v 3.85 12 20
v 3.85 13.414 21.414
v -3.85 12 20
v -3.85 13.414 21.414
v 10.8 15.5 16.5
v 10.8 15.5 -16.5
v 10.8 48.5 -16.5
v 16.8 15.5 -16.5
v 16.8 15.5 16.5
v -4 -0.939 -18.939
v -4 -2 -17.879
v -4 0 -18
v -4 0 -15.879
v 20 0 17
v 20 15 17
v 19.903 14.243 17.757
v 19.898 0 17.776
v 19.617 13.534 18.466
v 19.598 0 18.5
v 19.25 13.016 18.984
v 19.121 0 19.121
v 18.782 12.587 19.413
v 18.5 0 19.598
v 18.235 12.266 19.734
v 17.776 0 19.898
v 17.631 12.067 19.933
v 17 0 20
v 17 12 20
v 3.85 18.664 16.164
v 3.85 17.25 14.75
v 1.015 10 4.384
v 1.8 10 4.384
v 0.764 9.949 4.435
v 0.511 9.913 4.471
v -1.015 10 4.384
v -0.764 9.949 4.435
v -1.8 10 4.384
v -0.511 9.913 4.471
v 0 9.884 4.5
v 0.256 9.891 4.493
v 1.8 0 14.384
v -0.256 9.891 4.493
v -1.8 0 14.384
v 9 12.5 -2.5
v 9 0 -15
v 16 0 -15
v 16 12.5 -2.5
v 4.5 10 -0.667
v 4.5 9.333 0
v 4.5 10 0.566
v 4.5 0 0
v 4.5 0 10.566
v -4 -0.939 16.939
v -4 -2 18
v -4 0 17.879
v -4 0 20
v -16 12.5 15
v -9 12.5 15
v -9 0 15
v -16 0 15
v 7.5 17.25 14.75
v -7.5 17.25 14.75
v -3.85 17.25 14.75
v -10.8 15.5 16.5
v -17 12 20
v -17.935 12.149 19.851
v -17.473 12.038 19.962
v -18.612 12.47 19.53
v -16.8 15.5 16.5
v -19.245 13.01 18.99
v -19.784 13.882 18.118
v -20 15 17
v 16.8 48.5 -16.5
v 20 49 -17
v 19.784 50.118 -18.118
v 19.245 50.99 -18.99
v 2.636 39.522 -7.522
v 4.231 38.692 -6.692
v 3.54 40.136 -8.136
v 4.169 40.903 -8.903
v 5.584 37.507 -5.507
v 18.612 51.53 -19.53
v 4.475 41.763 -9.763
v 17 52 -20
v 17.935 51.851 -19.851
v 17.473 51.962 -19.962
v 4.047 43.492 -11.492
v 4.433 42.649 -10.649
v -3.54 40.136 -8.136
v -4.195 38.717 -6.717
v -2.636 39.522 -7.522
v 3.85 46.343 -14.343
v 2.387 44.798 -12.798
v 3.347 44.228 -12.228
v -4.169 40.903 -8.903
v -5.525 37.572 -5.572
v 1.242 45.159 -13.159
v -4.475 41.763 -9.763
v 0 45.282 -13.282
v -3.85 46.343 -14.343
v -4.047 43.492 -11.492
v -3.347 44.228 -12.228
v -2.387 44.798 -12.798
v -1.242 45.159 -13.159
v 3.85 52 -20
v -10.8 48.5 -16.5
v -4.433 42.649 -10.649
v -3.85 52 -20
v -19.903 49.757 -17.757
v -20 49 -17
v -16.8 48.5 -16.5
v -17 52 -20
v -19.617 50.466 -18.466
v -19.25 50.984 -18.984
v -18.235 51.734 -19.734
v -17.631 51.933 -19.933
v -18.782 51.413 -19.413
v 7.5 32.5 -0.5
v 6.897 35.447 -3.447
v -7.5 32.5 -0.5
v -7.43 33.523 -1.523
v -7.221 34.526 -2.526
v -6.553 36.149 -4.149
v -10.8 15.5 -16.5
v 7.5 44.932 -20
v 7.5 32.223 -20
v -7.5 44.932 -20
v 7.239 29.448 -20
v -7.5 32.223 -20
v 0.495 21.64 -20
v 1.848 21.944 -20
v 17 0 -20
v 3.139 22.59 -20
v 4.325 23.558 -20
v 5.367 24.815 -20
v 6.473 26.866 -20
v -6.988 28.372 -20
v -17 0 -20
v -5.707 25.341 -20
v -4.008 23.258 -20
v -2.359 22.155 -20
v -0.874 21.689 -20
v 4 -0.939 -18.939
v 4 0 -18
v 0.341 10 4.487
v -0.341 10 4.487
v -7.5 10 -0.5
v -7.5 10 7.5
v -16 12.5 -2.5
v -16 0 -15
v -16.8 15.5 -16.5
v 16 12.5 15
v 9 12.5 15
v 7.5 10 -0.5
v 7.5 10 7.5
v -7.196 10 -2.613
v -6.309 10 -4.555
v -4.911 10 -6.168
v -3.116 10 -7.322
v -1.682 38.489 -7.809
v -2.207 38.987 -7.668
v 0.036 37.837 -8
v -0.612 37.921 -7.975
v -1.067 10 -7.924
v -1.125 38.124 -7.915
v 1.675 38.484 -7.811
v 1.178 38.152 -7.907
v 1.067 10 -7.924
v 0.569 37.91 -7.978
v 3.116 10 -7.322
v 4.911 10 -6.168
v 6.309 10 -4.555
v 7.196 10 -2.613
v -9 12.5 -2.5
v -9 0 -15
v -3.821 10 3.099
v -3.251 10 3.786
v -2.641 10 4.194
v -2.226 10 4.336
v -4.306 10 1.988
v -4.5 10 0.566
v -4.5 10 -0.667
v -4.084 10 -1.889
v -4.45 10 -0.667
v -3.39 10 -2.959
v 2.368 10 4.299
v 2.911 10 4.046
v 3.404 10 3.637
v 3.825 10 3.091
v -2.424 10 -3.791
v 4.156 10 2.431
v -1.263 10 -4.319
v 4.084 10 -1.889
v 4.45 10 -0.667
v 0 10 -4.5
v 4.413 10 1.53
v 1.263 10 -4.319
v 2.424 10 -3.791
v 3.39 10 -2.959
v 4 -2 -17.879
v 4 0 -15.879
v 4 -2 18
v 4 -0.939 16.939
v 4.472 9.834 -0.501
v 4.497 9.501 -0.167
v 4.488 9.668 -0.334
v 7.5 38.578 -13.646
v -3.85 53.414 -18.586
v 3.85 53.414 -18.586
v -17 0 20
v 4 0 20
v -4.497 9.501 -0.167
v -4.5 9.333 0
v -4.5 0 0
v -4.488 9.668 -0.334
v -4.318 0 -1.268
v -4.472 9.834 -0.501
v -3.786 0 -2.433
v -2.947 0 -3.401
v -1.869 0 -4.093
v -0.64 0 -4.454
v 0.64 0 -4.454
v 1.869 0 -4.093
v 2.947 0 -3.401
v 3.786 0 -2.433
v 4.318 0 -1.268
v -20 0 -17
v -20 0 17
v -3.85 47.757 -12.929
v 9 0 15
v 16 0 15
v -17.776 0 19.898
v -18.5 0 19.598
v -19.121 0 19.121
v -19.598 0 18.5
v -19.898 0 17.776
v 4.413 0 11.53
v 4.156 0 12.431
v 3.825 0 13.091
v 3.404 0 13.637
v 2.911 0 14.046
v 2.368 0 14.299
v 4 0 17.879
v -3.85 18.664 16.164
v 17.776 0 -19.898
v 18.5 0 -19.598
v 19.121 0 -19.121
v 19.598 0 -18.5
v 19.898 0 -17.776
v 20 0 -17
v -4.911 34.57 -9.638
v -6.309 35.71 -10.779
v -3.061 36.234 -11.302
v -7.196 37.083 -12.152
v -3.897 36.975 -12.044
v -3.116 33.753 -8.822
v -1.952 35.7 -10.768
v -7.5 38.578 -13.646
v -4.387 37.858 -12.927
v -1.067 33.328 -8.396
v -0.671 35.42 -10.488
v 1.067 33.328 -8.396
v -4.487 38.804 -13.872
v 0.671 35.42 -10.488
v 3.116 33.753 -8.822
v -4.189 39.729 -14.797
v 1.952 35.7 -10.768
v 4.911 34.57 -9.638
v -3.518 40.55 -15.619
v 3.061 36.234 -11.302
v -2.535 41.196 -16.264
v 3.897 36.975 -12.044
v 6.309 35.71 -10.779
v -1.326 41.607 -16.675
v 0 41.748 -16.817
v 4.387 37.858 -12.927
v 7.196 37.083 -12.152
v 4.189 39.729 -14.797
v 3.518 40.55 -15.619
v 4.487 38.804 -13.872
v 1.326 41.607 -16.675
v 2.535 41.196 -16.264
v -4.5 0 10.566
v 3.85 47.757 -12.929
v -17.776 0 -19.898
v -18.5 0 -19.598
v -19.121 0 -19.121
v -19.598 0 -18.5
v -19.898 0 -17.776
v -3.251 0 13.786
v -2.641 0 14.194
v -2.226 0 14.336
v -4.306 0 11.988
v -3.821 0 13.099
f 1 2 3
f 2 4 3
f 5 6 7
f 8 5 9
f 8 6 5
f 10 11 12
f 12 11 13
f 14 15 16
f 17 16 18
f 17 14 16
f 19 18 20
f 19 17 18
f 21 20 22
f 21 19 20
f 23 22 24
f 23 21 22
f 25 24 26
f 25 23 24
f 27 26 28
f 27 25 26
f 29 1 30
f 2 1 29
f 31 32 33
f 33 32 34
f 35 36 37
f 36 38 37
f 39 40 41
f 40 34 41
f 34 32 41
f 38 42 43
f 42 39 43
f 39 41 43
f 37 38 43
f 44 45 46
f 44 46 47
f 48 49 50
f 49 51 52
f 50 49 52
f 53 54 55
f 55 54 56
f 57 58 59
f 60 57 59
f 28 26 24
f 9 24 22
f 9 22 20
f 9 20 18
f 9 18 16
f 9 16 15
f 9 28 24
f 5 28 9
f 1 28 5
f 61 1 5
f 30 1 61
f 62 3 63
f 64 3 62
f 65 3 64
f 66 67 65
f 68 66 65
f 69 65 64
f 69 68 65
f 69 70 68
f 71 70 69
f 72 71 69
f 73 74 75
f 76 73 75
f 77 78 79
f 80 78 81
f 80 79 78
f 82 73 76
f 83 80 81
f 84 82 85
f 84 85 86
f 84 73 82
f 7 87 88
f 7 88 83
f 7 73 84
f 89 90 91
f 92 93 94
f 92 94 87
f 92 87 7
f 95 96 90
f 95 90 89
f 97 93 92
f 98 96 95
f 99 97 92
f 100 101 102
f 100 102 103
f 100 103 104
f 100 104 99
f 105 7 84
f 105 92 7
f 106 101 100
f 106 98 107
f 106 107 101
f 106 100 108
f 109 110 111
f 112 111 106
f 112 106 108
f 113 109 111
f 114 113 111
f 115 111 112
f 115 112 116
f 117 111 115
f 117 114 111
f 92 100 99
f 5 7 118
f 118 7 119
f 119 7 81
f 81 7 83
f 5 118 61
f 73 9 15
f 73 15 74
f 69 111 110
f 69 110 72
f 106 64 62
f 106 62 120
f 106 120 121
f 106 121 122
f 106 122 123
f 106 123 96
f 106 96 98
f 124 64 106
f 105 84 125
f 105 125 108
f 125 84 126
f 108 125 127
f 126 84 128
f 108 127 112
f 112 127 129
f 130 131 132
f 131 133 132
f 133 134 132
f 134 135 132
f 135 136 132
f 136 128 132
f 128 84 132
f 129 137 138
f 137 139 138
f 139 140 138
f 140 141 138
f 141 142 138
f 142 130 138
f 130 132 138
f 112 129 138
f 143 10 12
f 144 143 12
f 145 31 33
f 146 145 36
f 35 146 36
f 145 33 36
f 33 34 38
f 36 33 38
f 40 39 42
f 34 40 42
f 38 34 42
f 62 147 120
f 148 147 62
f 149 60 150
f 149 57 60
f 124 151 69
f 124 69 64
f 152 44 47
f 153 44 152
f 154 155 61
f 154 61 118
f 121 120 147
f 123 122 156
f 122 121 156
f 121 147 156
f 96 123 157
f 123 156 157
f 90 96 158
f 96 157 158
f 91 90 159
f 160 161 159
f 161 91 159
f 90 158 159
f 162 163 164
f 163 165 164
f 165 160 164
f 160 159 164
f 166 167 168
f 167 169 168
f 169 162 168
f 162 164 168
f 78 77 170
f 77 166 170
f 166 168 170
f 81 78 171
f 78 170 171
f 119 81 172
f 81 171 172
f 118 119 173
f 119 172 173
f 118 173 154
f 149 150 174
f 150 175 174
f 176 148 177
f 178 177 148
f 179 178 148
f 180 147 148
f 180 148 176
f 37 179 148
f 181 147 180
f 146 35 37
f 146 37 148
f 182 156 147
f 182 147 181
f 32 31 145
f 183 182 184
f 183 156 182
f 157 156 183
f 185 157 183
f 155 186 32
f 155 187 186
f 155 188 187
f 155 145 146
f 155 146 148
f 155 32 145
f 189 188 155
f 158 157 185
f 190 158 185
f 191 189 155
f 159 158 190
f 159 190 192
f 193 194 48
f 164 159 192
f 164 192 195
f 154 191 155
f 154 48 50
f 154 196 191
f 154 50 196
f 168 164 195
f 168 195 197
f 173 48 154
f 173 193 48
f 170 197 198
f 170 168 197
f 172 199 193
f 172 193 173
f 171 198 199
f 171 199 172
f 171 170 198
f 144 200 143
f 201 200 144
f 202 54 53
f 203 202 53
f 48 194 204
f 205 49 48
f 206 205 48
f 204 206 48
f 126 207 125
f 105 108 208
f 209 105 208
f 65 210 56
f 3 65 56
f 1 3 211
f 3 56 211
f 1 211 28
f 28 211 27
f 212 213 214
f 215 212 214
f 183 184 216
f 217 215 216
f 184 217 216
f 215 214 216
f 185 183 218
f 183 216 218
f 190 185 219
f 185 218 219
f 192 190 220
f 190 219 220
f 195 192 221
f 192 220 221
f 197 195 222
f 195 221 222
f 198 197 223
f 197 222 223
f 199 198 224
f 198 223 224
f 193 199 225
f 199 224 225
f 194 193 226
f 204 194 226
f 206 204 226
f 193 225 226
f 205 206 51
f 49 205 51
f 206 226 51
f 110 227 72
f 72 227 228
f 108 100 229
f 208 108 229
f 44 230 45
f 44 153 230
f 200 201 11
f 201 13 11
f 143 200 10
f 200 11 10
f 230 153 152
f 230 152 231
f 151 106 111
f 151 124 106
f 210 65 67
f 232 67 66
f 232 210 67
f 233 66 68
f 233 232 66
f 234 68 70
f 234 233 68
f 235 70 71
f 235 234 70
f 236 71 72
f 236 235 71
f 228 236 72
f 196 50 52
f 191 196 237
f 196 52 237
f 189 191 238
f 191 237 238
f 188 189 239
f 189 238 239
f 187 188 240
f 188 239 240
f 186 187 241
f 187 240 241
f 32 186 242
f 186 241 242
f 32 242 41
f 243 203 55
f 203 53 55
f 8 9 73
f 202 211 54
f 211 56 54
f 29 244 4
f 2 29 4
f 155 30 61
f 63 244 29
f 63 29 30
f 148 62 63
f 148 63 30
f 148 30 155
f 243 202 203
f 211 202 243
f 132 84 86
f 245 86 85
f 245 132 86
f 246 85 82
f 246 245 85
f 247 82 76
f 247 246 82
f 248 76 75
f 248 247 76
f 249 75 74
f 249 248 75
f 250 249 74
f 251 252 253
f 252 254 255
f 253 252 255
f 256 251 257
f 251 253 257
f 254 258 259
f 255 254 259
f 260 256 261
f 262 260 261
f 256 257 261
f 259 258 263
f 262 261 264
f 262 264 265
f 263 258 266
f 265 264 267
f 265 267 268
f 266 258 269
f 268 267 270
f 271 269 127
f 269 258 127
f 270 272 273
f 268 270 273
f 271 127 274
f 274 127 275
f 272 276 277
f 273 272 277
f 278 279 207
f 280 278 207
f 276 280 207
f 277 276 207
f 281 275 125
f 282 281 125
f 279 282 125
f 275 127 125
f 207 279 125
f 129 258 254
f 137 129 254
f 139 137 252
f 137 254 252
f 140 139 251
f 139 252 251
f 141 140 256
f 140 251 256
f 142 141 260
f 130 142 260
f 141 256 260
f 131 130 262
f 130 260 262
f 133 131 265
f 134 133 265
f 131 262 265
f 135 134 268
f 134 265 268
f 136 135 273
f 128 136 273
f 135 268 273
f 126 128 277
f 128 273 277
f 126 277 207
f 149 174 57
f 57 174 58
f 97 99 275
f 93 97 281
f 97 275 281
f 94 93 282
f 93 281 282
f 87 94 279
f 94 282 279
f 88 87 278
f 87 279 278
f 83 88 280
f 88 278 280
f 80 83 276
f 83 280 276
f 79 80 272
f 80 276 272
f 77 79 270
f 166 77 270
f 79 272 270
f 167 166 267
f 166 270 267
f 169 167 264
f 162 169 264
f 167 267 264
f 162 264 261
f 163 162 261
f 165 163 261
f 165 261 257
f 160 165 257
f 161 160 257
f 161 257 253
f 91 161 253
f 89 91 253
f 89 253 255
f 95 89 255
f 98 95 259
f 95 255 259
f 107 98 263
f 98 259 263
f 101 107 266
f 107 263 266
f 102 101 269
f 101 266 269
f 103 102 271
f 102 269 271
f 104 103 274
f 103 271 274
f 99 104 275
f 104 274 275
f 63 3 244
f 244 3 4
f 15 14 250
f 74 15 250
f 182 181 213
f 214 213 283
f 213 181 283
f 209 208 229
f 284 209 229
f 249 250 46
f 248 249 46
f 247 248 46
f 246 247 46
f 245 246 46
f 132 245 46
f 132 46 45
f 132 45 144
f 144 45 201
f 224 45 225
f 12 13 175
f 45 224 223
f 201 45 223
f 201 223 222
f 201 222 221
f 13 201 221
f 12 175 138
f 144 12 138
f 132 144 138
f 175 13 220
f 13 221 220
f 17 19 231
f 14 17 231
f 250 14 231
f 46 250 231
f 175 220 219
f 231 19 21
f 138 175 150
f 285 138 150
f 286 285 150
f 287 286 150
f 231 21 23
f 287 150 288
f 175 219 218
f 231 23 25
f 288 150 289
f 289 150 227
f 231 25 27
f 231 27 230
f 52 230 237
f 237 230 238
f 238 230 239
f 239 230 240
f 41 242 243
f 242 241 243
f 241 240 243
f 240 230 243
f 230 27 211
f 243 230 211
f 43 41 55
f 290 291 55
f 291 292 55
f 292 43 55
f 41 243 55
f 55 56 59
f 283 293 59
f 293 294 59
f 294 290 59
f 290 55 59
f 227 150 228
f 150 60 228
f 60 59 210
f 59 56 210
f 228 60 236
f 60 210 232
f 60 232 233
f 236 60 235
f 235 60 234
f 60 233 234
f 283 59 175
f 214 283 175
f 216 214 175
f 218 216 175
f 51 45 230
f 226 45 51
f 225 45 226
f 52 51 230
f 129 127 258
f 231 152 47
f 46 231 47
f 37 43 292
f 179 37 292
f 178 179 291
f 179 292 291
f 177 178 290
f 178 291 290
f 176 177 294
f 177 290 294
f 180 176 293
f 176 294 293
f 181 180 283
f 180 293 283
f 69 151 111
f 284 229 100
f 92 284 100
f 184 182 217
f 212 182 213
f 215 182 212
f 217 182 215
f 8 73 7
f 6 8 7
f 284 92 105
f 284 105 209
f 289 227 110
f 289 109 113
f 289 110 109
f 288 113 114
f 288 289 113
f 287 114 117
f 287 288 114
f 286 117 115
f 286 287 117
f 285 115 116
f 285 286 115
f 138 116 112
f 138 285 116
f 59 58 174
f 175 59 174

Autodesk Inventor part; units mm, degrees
ref_plane "YZ Plane" through (0, 0, 0) normal (1, 0, 0) x (0, 1, 0)
ref_plane "XZ Plane" through (0, 0, 0) normal (0, 1, 0) x (-1, 0, 0)
ref_plane "XY Plane" through (0, 0, 0) normal (0, 0, 1) x (1, 0, 0)
sketch "Sketch_1" plane through (0, 0, 0) normal (0, 1, 0) x (-1, 0, 0)
  arc A0 (20, 17) -> (17, 20) centre (17, 17) ccw
  line L0 (17, 20) -> (-17, 20)
  arc A1 (-17, 20) -> (-20, 17) centre (-17, 17) ccw
  line L1 (-20, 17) -> (-20, -17)
  arc A2 (-20, -17) -> (-17, -20) centre (-17, -17) ccw
  line L2 (-17, -20) -> (17, -20)
  arc A3 (17, -20) -> (20, -17) centre (17, -17) ccw
  line L3 (20, -17) -> (20, 17)
extrude "Extrusion1" add sketch "Sketch_1" along normal blind 52
sketch "Sketch_2" plane through (0, 0, 0) normal (1, 0, 0) x (0, 1, 0)
  line L0 (12, 20) -> (52, -20)
  line L1 (52, -20) -> (52, 20)
  line L2 (52, 20) -> (12, 20)
extrude "Extrusion2" cut sketch "Sketch_2" along normal mid plane 40
sketch "Sketch_13" plane through (0, 0, 0) normal (1, 0, 0) x (0, 1, 0)
  line L0 (13.4142, 21.4142) -> (12, 20)
  line L1 (12, 20) -> (17.3033, 14.6967)
  line L2 (17.3033, 14.6967) -> (18.7175, 16.1109)
  line L3 (18.7175, 16.1109) -> (13.4142, 21.4142)
extrude "Extrusion3" add sketch "Sketch_13" along normal mid plane 7.7
sketch "Sketch_14" plane through (0, 0, 0) normal (1, 0, 0) x (0, 1, 0)
  line L0 (47.7574, -12.9289) -> (46.3431, -14.3431)
  line L1 (46.3431, -14.3431) -> (52, -20)
  line L2 (52, -20) -> (53.4142, -18.5858)
  line L3 (53.4142, -18.5858) -> (47.7574, -12.9289)
extrude "Extrusion4" add sketch "Sketch_14" along normal mid plane 7.7
sketch "Sketch_3" plane through (0, 15.5, 0) normal (0, 1, 0) x (1, 0, 0)
  line L0 (-16.8, -23.5) -> (-10.8, -23.5)
  line L1 (-10.8, -23.5) -> (-10.8, 16.5)
  line L2 (-10.8, 16.5) -> (-16.8, 16.5)
  line L3 (-16.8, 16.5) -> (-16.8, -23.5)
extrude "Extrusion5" cut sketch "Sketch_3" along normal blind 40
sketch "Sketch_4" plane through (0, 15.5, 0) normal (0, 1, 0) x (1, 0, 0)
  line L0 (10.8, -23.5) -> (16.8, -23.5)
  line L1 (16.8, -23.5) -> (16.8, 16.5)
  line L2 (16.8, 16.5) -> (10.8, 16.5)
  line L3 (10.8, 16.5) -> (10.8, -23.5)
extrude "Extrusion6" cut sketch "Sketch_4" along normal blind 40
sketch "Sketch_5" plane through (0, 10, 0) normal (0, 1, 0) x (1, 0, 0)
  line L0 (-7.5, 0.5) -> (-7.5, -7.5)
  line L1 (-7.5, -7.5) -> (7.5, -7.5)
  line L2 (7.5, -7.5) -> (7.5, 0.5)
  arc A0 (7.5, 0.5) -> (-7.5, 0.5) centre (0, 0.5) ccw
extrude "Extrusion7" cut sketch "Sketch_5" along normal blind 40
sketch "Sketch_6" plane through (0, 0, 0) normal (1, 0, 0) x (0, 1, 0)
  line L0 (50, 20) -> (22.5, 20)
  line L1 (22.5, 20) -> (10, 7.5)
  line L2 (10, 7.5) -> (50, 7.5)
  line L3 (50, 7.5) -> (50, 20)
extrude "Extrusion8" cut sketch "Sketch_6" along normal mid plane 15
sketch "Sketch9" plane through (0, 10, 0) normal (0, 1, 0) x (1, 0, 0)
  point P0 (0, 0)
hole "Hole1" at (0, 10, 0) direction (0, -1, 0) diameter 9 depth 10
sketch "Sketch_8" plane through (0, 0, 14.3841) normal (0, -0.7071, 0.7071) x (1, 0, 0)
  line L0 (-4.5, -2.7) -> (-4.5, -3.5714)
  line L1 (-4.5, -3.5714) -> (4.5, -3.5714)
  line L2 (4.5, -3.5714) -> (4.5, -2.7)
  arc A0 (4.5, -2.7) -> (1.8, 0) centre (1.8, -2.7) ccw
  line L3 (1.8, 0) -> (-1.8, 0)
  arc A1 (-1.8, 0) -> (-4.5, -2.7) centre (-1.8, -2.7) ccw
extrude "Extrusion9" cut sketch "Sketch_8" against normal blind 20
sketch "Sketch_9" plane through (0, 0, 0) normal (1, 0, 0) x (0, 1, 0)
  line L0 (0, 9.67) -> (0, 0)
  line L1 (0, 0) -> (10, 0)
  line L2 (10, 0) -> (10, 4.3841)
  line L3 (10, 4.3841) -> (4.7141, 9.67)
  line L4 (4.7141, 9.67) -> (0, 9.67)
extrude "Extrusion10" cut sketch "Sketch_9" along normal mid plane 3
sketch "Sketch_10" plane through (0, 0, 0) normal (1, 0, 0) x (0, 1, 0)
  line L0 (0.7957, 9.77) -> (0, 9.77)
  line L1 (0, 9.77) -> (0, 0)
  line L2 (0, 0) -> (10, 0)
  line L3 (10, 0) -> (10, 0.5657)
  line L4 (10, 0.5657) -> (0.7957, 9.77)
extrude "Extrusion11" cut sketch "Sketch_10" along normal mid plane 9
sketch "Sketch_11" plane through (0, 0, 0) normal (1, 0, 0) x (0, 1, 0)
  line L0 (27.9584, -24.2426) -> (42.1005, -10.1005)
  line L1 (42.1005, -10.1005) -> (45.2825, -13.2825)
  line L2 (45.2825, -13.2825) -> (31.1403, -27.4246)
  line L3 (31.1403, -27.4246) -> (27.9584, -24.2426)
  line L4 (27.9584, -24.2426) -> (42.1005, -10.1005)
revolve "Revolution1" cut sketch "Sketch_11" angle 360 about axis through (0, 27.9584, -24.2426) along (0, -0.7071, -0.7071)
sketch "Sketch_15" plane through (0, 0, 0) normal (1, 0, 0) x (0, 1, 0)
  line L0 (0, 20) -> (-2, 18)
  line L1 (-2, 18) -> (-0.9393, 16.9393)
  line L2 (-0.9393, 16.9393) -> (1.0607, 18.9393)
  line L3 (1.0607, 18.9393) -> (0, 20)
extrude "Extrusion12" add sketch "Sketch_15" along normal mid plane 8
sketch "Sketch_16" plane through (0, 0, 0) normal (1, 0, 0) x (0, 1, 0)
  line L0 (0, -15.8787) -> (-2, -17.8787)
  line L1 (-2, -17.8787) -> (-0.9393, -18.9393)
  line L2 (-0.9393, -18.9393) -> (1.0607, -16.9393)
  line L3 (1.0607, -16.9393) -> (0, -15.8787)
extrude "Extrusion13" add sketch "Sketch_16" along normal mid plane 8
sketch "Sketch_12" plane through (0, 28.4645, -3.5355) normal (0, 0.7071, 0.7071) x (1, 0, 0)
  arc A0 (-7.5, 14.3) -> (7.5, 14.3) centre (0, 14.3) ccw
  line L0 (7.5, 14.3) -> (7.5, 23.3)
  line L1 (7.5, 23.3) -> (-7.5, 23.3)
  line L2 (-7.5, 23.3) -> (-7.5, 14.3)
extrude "Extrusion14" cut sketch "Sketch_12" against normal blind 40
sketch "Sketch_17" plane through (9, 0, 0) normal (1, 0, 0) x (0, 0, -1)
  line L0 (-15, 12.5) -> (-15, 0)
  line L1 (-15, 0) -> (15, 0)
  line L2 (15, 0) -> (2.5, 12.5)
  line L3 (2.5, 12.5) -> (-15, 12.5)
extrude "Extrusion15" cut sketch "Sketch_17" along normal blind 7
sketch "Sketch_18" plane through (-9, 0, 0) normal (1, 0, 0) x (0, 0, -1)
  line L0 (-15, 12.5) -> (-15, 0)
  line L1 (-15, 0) -> (15, 0)
  line L2 (15, 0) -> (2.5, 12.5)
  line L3 (2.5, 12.5) -> (-15, 12.5)
extrude "Extrusion16" cut sketch "Sketch_18" against normal blind 7
properties part number "14118"
